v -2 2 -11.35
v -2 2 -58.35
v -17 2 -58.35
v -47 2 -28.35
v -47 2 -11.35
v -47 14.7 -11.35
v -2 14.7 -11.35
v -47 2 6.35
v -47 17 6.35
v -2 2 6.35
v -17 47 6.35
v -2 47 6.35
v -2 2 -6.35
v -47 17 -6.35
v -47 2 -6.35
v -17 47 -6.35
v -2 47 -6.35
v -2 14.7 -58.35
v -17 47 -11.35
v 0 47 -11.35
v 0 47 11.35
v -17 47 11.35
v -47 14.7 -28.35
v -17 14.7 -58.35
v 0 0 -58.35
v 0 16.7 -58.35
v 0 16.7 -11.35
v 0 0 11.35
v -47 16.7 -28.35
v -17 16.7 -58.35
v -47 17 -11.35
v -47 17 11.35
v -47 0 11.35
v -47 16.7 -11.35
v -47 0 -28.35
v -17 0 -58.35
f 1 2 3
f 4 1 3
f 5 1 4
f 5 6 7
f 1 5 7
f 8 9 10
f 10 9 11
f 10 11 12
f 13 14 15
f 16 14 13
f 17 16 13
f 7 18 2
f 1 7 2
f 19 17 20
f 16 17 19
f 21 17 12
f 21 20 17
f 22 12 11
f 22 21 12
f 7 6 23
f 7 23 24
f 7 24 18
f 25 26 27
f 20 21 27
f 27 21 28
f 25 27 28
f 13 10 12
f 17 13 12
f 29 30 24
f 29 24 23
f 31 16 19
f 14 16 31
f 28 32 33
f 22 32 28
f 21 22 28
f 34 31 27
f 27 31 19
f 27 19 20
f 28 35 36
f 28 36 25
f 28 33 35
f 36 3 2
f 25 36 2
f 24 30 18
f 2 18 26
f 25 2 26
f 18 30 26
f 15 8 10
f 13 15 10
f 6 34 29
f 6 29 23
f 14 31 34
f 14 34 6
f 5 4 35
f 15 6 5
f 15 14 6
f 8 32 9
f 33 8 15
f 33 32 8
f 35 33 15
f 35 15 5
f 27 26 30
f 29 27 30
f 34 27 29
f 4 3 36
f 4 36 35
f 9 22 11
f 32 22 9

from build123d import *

# Parameters (mm, degrees)
BOSS_EXTRUDE1_DEPTH = 11.35
CUT_EXTRUDE1_DEPTH  = 6.35
BOSS_EXTRUDE2_DEPTH = 47
CUT_EXTRUDE2_DEPTH  = 47


with BuildPart() as part:
    # Sketch1 → Boss-Extrude1 (new body, symmetric)
    with BuildSketch(Plane.XY):
        Polygon((0, 0), (0, 47), (-17, 47), (-47, 17), (-47, 0), align=None)
    extrude(amount=BOSS_EXTRUDE1_DEPTH, both=True)

    # Sketch2 → Cut-Extrude1 (cut, symmetric)
    with BuildSketch(Plane.XY):
        Polygon((-47, 17), (-47, 2), (-2, 2), (-2, 47), (-17, 47), align=None)
    extrude(amount=CUT_EXTRUDE1_DEPTH, both=True, mode=Mode.SUBTRACT)

    # Sketch3 → Boss-Extrude2 (add)
    with BuildSketch(Plane(origin=(0, 0, -11.35), x_dir=(-1, 0, 0), z_dir=(0, 0, -1))):
        Polygon((0, 0), (0, 2), (0, 14.7), (0, 16.7), (47, 16.7), (47, 14.7), (2, 14.7), (2, 2), (47, 2), (47, 0), align=None)
    extrude(amount=BOSS_EXTRUDE2_DEPTH)

    # Sketch4 → Cut-Extrude2 (cut)
    with BuildSketch(Plane(origin=(0, 16.7, 0), x_dir=(1, 0, 0), z_dir=(0, 1, 0))):
        Polygon((-17, 58.35), (-47, 28.35), (-47, 58.35), align=None)
    extrude(amount=-CUT_EXTRUDE2_DEPTH, mode=Mode.SUBTRACT)


solid = part.part
